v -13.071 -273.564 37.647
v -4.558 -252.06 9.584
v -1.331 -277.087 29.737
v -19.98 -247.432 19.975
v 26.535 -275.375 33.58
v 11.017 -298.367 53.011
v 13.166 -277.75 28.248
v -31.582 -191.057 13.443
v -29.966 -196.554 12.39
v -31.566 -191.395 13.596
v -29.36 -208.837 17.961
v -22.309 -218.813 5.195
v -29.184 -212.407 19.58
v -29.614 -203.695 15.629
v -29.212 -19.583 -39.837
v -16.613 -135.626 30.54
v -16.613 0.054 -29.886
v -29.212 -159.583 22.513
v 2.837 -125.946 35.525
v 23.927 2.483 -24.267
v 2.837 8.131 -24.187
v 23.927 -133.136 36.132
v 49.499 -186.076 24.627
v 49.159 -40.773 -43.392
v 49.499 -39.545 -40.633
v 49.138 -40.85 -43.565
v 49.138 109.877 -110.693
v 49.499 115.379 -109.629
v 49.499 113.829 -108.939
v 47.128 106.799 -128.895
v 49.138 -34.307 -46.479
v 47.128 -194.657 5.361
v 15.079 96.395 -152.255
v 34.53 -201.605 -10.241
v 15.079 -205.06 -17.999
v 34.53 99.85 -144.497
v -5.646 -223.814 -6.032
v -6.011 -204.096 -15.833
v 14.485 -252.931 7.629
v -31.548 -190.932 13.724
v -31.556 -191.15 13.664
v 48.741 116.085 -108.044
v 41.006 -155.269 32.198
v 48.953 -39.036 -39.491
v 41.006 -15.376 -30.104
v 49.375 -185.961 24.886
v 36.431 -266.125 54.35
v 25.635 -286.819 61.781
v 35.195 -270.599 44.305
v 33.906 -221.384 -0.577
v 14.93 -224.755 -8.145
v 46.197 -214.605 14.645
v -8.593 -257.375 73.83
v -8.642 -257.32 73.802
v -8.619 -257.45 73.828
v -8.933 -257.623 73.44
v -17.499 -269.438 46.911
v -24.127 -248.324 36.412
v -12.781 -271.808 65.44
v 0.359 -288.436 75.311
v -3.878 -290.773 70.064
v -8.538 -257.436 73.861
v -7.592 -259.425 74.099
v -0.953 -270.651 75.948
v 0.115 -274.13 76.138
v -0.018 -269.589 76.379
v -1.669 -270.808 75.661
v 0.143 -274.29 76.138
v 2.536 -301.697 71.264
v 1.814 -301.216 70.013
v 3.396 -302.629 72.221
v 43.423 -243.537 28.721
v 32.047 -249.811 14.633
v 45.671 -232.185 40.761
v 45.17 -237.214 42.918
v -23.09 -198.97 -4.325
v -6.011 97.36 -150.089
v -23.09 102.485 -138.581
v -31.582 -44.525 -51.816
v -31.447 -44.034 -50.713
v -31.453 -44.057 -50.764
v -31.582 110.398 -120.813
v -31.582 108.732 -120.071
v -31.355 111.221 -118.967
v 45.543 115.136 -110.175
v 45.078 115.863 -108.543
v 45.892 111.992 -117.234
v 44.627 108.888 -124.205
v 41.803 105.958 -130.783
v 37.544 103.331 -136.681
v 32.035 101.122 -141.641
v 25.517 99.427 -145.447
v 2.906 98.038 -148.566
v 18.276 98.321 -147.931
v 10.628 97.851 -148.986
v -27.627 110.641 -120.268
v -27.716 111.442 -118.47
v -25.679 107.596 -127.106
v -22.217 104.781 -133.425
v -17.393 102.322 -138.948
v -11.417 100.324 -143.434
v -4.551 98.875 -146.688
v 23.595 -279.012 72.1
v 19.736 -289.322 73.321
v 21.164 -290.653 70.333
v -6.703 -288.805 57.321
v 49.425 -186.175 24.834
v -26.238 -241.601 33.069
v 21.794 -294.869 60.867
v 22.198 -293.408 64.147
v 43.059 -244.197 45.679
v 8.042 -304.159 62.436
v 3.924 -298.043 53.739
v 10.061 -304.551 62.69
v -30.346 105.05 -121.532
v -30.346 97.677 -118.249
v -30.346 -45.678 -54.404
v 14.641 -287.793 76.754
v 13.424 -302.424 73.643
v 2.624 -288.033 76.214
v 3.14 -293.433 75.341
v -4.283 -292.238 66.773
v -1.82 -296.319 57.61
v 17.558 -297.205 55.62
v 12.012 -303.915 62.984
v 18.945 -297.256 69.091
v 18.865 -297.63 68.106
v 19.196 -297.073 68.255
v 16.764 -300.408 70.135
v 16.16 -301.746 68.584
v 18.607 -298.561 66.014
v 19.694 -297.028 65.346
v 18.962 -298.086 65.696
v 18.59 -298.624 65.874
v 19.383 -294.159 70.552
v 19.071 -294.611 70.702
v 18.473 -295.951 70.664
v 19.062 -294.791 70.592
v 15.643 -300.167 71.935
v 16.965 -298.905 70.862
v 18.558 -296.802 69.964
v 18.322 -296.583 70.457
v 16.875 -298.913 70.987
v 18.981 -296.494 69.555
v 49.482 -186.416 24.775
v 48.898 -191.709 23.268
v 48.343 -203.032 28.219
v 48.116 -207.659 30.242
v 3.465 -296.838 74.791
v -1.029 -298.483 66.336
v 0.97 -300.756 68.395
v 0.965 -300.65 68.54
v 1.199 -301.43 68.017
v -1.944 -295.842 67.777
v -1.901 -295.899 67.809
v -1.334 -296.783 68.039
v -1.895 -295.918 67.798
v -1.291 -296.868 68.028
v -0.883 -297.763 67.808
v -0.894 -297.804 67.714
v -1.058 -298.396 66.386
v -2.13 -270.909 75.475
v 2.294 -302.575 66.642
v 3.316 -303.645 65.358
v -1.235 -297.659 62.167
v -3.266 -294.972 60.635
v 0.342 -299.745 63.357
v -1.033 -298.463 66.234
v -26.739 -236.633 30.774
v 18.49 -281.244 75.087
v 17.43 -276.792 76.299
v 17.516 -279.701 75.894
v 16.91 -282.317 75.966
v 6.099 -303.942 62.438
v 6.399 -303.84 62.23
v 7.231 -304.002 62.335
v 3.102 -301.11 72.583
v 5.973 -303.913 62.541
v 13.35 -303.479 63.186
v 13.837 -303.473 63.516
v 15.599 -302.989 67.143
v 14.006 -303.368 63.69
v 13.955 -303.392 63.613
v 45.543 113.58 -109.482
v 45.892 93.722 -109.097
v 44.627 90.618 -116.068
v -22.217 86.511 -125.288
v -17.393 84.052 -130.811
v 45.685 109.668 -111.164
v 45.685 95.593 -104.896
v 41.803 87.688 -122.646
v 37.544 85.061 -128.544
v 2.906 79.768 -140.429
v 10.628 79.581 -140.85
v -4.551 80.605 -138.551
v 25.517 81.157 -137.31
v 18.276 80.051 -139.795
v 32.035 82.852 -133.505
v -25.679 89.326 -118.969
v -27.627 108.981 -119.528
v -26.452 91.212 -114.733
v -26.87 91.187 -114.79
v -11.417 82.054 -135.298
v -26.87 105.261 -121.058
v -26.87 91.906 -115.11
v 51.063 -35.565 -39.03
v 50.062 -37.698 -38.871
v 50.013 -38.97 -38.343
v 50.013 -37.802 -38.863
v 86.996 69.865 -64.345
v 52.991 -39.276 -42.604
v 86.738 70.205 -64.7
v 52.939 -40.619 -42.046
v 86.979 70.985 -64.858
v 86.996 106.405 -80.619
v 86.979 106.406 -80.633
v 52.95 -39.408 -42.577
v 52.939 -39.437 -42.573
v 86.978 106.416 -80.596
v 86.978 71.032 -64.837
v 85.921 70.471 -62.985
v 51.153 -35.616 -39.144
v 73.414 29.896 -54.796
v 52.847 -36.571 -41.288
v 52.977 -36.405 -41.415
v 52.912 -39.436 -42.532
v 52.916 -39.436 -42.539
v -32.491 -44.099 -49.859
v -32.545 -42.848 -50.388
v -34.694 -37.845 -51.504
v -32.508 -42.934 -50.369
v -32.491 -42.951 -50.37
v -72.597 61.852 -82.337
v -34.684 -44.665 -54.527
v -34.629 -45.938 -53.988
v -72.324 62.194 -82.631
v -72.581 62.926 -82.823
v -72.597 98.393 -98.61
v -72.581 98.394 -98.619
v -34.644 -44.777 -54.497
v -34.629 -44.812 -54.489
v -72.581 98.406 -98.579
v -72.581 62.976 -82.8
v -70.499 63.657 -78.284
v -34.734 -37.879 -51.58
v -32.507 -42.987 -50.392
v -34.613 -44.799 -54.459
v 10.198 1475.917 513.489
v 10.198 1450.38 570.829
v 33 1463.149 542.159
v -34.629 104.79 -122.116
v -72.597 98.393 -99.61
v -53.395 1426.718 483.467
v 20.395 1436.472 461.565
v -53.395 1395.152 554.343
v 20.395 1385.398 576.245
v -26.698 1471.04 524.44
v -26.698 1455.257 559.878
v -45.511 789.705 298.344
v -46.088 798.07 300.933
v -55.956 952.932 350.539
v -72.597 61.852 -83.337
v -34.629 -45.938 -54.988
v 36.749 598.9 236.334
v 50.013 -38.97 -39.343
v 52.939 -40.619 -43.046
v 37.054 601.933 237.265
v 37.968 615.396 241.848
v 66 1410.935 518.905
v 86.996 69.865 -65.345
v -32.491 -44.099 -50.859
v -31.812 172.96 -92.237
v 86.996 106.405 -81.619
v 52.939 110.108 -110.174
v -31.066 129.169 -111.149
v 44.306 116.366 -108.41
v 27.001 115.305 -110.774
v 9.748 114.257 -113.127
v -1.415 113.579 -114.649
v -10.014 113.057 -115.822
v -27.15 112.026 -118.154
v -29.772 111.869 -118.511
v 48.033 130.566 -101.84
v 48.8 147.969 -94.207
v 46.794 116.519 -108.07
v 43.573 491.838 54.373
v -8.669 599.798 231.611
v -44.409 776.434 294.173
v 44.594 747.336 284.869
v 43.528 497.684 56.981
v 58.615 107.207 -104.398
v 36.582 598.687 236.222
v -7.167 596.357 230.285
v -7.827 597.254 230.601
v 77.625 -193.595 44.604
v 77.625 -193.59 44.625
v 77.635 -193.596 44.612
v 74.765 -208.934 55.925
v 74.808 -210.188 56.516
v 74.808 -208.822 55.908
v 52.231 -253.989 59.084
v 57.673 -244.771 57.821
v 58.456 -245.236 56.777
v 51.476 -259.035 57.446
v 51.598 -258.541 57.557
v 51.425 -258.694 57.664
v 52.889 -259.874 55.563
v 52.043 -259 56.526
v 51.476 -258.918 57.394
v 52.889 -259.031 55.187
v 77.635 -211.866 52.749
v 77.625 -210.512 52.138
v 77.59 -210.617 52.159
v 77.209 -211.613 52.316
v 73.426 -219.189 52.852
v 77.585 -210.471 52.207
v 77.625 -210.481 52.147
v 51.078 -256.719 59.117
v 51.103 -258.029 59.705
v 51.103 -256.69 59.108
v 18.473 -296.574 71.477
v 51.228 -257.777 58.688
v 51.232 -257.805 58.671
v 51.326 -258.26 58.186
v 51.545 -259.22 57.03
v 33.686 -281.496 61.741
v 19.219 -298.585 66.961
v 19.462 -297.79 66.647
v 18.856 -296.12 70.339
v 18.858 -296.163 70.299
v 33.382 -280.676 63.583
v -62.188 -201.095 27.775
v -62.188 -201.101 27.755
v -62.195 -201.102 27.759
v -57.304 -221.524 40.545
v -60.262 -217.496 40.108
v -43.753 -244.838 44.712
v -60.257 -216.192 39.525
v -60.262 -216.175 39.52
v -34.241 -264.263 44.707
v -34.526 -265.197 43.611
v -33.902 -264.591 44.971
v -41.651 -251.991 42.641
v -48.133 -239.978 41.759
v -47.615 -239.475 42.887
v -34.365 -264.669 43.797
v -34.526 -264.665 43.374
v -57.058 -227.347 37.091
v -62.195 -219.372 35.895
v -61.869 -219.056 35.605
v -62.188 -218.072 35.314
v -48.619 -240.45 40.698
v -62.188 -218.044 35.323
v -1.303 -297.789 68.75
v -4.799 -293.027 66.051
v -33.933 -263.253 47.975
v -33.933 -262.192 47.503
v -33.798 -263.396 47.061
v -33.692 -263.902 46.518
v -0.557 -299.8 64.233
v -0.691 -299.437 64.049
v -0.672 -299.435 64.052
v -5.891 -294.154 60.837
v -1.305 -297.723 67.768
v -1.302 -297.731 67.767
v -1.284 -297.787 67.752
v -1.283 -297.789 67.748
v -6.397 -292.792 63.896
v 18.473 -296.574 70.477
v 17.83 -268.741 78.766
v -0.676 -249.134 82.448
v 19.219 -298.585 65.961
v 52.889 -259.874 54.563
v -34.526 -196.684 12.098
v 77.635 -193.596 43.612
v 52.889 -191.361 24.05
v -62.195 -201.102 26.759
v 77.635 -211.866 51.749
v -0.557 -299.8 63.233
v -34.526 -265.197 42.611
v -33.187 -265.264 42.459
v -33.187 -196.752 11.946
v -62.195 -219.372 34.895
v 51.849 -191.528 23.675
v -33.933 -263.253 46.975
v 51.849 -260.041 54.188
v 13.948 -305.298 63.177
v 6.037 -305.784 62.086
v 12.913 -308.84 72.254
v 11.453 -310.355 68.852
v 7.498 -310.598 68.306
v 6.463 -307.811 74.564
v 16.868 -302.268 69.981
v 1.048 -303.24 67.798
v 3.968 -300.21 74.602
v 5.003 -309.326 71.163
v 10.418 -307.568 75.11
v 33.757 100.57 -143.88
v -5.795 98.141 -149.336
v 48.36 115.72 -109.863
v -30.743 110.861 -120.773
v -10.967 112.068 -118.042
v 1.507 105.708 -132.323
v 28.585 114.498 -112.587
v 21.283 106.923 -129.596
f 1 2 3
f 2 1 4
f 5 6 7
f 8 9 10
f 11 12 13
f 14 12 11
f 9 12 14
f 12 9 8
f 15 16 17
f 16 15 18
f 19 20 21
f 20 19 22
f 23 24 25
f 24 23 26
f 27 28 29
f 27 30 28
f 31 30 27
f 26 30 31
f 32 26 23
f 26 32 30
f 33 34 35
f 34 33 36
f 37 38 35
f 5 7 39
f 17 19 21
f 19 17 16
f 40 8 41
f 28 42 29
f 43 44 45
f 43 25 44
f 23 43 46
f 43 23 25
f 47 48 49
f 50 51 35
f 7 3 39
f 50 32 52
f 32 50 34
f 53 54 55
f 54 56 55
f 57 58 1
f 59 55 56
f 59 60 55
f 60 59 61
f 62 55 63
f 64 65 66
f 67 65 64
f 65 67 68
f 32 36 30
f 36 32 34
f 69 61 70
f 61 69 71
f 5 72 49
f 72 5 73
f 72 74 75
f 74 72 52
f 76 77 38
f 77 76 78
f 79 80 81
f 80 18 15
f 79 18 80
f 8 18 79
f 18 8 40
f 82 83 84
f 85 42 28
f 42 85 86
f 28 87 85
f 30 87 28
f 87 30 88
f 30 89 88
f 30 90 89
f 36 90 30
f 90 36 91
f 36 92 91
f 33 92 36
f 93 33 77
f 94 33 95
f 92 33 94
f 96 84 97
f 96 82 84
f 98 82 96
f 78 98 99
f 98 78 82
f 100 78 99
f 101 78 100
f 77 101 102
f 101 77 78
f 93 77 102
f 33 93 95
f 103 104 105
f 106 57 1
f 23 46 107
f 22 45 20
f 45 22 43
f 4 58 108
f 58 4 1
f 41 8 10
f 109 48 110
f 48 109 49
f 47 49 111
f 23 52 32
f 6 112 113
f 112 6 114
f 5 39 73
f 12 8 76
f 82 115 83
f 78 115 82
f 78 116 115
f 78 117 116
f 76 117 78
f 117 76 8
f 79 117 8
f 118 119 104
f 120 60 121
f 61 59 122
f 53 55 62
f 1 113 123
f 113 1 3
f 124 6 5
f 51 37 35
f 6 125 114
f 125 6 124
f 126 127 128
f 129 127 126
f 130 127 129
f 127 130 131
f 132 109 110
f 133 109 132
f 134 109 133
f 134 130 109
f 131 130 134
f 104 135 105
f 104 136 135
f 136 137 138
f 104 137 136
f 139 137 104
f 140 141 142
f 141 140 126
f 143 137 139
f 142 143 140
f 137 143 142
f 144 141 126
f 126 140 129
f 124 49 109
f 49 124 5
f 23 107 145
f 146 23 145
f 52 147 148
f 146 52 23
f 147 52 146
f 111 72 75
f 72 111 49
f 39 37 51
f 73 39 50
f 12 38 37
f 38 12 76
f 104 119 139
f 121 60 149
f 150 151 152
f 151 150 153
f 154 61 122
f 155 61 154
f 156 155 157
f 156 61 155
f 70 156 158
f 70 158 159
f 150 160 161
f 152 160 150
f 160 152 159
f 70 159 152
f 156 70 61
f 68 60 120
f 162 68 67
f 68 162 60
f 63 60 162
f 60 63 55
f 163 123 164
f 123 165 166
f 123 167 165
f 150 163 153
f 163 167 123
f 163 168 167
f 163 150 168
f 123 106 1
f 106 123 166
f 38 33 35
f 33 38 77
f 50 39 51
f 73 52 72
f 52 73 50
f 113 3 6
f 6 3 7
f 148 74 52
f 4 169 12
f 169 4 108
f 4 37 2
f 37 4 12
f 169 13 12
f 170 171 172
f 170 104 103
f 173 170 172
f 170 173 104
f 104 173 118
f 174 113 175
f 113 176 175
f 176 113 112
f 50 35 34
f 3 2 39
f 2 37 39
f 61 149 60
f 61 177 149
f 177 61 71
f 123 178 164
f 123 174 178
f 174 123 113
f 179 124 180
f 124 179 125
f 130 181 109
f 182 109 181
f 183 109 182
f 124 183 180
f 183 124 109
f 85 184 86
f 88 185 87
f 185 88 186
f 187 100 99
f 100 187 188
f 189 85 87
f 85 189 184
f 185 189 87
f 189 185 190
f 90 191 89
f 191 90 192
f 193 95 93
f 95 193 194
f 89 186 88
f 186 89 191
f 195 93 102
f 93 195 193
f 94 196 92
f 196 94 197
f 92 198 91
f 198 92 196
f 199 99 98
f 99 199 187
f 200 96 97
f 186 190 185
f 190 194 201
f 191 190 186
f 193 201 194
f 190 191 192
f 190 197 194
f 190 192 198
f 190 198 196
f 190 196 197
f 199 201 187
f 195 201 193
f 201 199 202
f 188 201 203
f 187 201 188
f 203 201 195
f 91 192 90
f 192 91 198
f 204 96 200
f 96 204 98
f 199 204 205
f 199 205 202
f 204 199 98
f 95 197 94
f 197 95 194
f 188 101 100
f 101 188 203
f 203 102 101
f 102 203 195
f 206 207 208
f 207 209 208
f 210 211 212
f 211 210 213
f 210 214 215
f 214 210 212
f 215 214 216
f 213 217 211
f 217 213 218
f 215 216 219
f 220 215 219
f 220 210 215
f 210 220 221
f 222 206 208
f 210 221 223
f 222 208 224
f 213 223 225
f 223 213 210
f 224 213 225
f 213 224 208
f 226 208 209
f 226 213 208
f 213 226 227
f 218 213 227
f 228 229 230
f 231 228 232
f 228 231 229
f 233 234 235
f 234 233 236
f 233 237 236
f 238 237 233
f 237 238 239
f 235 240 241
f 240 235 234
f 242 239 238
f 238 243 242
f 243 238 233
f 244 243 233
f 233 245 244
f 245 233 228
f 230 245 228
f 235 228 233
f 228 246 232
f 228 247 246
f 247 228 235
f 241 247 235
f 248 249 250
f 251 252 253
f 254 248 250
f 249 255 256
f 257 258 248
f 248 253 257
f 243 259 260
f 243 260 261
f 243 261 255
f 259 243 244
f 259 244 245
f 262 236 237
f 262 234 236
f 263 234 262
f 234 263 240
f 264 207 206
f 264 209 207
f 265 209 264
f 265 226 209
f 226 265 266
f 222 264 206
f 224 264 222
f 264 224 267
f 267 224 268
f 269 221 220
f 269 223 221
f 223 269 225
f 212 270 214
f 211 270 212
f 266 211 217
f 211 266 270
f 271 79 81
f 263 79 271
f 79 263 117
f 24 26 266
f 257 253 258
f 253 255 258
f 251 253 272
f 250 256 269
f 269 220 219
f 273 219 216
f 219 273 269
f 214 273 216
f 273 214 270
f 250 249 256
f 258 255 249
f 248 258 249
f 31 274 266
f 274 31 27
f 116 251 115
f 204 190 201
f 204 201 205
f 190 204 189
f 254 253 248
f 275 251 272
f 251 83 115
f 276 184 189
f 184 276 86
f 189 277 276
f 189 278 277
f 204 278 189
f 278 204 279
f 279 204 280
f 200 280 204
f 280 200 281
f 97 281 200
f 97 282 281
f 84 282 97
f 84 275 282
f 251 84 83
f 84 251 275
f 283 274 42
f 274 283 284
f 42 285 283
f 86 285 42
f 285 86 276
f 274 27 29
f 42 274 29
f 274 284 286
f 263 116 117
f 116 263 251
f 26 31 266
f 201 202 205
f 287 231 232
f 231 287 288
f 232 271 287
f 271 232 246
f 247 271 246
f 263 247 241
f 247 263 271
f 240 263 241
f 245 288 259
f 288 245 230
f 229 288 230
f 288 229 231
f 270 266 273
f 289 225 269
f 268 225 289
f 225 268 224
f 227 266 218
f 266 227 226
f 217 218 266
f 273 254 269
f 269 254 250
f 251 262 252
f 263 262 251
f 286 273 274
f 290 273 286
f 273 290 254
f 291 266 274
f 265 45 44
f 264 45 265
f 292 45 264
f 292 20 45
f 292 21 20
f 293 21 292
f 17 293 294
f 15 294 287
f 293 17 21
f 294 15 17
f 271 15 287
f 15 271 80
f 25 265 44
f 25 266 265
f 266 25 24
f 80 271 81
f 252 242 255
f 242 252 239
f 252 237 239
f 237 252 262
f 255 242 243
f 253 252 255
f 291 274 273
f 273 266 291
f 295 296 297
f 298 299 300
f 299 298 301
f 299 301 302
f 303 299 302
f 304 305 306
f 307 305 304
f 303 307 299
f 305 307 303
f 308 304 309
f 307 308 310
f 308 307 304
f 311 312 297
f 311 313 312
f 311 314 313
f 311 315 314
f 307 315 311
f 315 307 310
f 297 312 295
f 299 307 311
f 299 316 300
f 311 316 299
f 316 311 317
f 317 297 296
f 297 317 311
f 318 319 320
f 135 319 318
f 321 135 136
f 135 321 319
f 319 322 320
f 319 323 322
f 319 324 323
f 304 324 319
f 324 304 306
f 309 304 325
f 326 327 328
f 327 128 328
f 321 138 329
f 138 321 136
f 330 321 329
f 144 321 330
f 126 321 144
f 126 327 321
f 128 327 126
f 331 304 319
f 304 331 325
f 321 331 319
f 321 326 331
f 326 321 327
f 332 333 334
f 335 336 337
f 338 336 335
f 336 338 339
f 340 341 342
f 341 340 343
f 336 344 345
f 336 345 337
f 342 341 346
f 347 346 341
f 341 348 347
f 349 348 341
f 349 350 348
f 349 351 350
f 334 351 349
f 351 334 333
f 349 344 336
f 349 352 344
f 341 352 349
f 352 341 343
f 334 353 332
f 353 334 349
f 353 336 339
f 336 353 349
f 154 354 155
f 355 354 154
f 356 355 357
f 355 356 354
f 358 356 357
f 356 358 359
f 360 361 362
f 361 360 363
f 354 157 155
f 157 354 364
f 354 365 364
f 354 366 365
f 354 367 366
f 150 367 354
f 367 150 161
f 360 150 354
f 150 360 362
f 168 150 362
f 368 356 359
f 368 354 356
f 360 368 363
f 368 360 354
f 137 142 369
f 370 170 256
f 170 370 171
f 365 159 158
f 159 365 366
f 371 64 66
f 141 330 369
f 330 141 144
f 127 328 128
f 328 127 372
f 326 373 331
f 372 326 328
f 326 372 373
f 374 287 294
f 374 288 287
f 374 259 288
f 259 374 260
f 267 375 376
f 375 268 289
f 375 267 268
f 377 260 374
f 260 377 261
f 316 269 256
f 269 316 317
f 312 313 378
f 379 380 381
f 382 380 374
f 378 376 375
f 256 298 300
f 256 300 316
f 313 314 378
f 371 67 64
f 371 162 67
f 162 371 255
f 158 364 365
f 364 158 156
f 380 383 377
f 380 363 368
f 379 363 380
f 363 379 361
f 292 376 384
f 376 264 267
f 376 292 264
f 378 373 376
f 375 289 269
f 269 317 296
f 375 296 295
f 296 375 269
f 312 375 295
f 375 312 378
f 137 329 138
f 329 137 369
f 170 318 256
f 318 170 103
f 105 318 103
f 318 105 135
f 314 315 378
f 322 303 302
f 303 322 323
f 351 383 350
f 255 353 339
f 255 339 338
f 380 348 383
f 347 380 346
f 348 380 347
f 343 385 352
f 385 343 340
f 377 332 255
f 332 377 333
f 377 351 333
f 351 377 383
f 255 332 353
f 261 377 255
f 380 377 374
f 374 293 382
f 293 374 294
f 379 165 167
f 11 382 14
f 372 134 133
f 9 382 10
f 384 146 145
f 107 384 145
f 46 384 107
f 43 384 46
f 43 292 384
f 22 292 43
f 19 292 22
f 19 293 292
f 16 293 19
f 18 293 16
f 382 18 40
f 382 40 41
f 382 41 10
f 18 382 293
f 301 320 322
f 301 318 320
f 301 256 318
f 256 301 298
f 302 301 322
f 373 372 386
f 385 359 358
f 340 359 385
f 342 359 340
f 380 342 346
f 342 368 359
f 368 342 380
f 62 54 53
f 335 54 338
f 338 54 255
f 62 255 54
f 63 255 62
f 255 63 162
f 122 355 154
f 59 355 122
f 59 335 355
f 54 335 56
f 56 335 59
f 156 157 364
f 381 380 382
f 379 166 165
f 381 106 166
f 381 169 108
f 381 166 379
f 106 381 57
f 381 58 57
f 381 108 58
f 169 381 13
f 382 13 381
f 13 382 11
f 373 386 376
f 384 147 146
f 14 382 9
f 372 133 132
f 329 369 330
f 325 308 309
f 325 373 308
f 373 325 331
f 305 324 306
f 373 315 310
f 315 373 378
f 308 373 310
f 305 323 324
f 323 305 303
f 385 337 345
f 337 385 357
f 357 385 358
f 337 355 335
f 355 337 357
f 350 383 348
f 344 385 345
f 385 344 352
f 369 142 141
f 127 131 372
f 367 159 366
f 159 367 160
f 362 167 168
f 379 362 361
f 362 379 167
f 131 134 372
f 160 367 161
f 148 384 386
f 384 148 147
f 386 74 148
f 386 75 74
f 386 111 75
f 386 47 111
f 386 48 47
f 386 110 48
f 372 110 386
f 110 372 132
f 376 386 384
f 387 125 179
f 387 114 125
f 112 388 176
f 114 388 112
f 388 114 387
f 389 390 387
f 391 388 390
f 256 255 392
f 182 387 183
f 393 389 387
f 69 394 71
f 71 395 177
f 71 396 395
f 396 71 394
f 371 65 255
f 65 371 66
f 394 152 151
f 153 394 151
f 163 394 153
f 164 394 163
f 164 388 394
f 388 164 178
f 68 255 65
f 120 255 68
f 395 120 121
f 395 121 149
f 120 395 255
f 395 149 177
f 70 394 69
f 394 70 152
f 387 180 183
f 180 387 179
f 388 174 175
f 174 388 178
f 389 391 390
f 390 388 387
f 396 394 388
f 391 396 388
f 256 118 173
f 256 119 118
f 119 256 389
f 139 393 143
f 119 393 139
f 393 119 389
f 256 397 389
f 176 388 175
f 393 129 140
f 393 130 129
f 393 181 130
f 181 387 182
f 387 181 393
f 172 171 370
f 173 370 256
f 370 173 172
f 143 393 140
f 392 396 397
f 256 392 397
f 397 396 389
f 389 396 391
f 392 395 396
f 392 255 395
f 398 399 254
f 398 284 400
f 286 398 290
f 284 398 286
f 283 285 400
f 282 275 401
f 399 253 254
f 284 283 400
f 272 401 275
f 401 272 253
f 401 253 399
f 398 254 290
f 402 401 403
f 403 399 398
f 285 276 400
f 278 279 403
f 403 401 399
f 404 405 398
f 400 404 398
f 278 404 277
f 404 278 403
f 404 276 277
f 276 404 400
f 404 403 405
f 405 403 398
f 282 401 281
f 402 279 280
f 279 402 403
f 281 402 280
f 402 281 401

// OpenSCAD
//  $t=.65;
$convexity=100;
ta=$t*1000;
//cx=sin(ta)*5;
//cy=cos(ta)*5;
//cz=sin(ta*0.1)*2+2;
cd=1600+cos(10-ta*0.7)*150;

 
 
 attack=abs(sin(40+ta*2)*.3+sin(20+ta*13)*.05)*4;
$vpt=[0,-250+100*attack,-10];


$vpr=[70+sin(ta)*10,0,-ta*.25+150];
$vpd=(cd);  
wings=[
10+sin(10+ta*9)*10+sin(110+ta*129)*2,
10+sin(20+ta*18)*10+sin(210+ta*121)*1,
10+sin(30+ta*27)*10+sin(103+ta*123)*2,
10+sin(40+ta*12)*10+sin(310+ta*139)*1

]*2;
  
  fire=    [    [0.35, 0.75, 0.55],
        [1., 1.2, 0.95],
        [ .20,   .25, .5],
        [ 0.,  0.13, 0.13] ];
shipwithattitude();
ground();

module ground(){

 

color("lightgreen")   for (i=[-2100:99:2100]){

translate([i,0,-1000]) scale([6*min(1,(1000/abs(i))),3500])rotate(45)square([1,1],center=true);
translate([0,i,-1000])  scale([3500,6*min(1,(1000/abs(i)))])rotate(45)square([1,1],center=true);
}



}


module         dragpoint()
{         rotate([

-45-(sin(40+ta*2)*30+sin(20+ta*13)*5)


,0,0])
translate([0, 100,1500]) 
scale (60*(1.1+sin(ta*10)))sphere (1);
}

module shipwithattitude()
{




ship(wings);}




module attitude(){

rotate([

45+sin(40+ta*2)*30+sin(20+ta*13)*5


,0,0]) 
rotate([0,0,sin(11+ta*5)*45]) 
translate([0,-60,-150])
children();
}
module trunk(){
   difference(){  color([.9,.9,.9])
rotate_extrude(,$fn=12)
{
   
    
    hull()   {
intersection (){
square([41,465]);
translate([0,454])circle(6);
}
intersection (){
square([41,459]);

union(){    
square([41,330]);
translate([-135,352])circle(175,$fn=34);


}}}


}

color([0.2,0.2,0.2])cylinder(40,37,37,center=true);
}
}
module ship(w){


attitude()  trunk();

compose(12,0) attitude()translate([0,0,455]) sphere(8,$fn=6);
compose(13,0) attitude()translate([0,1,0]) scale([40,40,0.01])sphere(1,$fn=6);

compose(2)  {  attitude()   lowwing(w[0]);
attitude()   mirror([1,0,0]) lowwing(w[2]);}



compose(13) {   attitude()   hiwing(w[1]);
attitude()  mirror([1,0,0])   hiwing(w[3]);
}}




module compose(i,v=1)
{
if (v==1) children();
col=pal((1+sin(i*11+ta*12))*0.5,fire); 
alpha=0.3+0.1*max(0,min(1,(
(1+sin(i*10+ta*12))*0.5
+(1+sin(i*5+ta*80))*0.5
+(1+sin(i*25+ta*121))*0.5)/3
)

);
color(
[0.5,0.5,0.5]+col*0.5

,alpha

)  hull(){  
dragpoint();       
translate([0,0,-1])  children();


}

}
module lowwing(r)


{color("gray")
translate([43,0,0])
rotate(r)
translate([-43,0,0])
rotate([90,0,0])   linear_extrude(5,center=true)   polygon([[43,5],[50,10],[85,20],[85,60],[43,170]]); 


}       


module hiwing(r)


{color("gray")
translate([43,0,0])
rotate(r)
translate([-43,0,0])
rotate([90,0,0])  
linear_extrude(5,center=true)   polygon([[43,335],[73,345],[73,365],[43,410] ]);   
    
color("darkgray")
rotate([90,0,0])  
linear_extrude(5,center=true)   polygon([[43,335],[43,410],[10,450] ]);   



}



 
    

function  pal(   t,   p )=[
for (i=[0:2]) max(0,min(1,
      p[0][i] + p[1][i]*cos( 360*(p[2][i]*(1-t)+p[3][i]) )))
];
